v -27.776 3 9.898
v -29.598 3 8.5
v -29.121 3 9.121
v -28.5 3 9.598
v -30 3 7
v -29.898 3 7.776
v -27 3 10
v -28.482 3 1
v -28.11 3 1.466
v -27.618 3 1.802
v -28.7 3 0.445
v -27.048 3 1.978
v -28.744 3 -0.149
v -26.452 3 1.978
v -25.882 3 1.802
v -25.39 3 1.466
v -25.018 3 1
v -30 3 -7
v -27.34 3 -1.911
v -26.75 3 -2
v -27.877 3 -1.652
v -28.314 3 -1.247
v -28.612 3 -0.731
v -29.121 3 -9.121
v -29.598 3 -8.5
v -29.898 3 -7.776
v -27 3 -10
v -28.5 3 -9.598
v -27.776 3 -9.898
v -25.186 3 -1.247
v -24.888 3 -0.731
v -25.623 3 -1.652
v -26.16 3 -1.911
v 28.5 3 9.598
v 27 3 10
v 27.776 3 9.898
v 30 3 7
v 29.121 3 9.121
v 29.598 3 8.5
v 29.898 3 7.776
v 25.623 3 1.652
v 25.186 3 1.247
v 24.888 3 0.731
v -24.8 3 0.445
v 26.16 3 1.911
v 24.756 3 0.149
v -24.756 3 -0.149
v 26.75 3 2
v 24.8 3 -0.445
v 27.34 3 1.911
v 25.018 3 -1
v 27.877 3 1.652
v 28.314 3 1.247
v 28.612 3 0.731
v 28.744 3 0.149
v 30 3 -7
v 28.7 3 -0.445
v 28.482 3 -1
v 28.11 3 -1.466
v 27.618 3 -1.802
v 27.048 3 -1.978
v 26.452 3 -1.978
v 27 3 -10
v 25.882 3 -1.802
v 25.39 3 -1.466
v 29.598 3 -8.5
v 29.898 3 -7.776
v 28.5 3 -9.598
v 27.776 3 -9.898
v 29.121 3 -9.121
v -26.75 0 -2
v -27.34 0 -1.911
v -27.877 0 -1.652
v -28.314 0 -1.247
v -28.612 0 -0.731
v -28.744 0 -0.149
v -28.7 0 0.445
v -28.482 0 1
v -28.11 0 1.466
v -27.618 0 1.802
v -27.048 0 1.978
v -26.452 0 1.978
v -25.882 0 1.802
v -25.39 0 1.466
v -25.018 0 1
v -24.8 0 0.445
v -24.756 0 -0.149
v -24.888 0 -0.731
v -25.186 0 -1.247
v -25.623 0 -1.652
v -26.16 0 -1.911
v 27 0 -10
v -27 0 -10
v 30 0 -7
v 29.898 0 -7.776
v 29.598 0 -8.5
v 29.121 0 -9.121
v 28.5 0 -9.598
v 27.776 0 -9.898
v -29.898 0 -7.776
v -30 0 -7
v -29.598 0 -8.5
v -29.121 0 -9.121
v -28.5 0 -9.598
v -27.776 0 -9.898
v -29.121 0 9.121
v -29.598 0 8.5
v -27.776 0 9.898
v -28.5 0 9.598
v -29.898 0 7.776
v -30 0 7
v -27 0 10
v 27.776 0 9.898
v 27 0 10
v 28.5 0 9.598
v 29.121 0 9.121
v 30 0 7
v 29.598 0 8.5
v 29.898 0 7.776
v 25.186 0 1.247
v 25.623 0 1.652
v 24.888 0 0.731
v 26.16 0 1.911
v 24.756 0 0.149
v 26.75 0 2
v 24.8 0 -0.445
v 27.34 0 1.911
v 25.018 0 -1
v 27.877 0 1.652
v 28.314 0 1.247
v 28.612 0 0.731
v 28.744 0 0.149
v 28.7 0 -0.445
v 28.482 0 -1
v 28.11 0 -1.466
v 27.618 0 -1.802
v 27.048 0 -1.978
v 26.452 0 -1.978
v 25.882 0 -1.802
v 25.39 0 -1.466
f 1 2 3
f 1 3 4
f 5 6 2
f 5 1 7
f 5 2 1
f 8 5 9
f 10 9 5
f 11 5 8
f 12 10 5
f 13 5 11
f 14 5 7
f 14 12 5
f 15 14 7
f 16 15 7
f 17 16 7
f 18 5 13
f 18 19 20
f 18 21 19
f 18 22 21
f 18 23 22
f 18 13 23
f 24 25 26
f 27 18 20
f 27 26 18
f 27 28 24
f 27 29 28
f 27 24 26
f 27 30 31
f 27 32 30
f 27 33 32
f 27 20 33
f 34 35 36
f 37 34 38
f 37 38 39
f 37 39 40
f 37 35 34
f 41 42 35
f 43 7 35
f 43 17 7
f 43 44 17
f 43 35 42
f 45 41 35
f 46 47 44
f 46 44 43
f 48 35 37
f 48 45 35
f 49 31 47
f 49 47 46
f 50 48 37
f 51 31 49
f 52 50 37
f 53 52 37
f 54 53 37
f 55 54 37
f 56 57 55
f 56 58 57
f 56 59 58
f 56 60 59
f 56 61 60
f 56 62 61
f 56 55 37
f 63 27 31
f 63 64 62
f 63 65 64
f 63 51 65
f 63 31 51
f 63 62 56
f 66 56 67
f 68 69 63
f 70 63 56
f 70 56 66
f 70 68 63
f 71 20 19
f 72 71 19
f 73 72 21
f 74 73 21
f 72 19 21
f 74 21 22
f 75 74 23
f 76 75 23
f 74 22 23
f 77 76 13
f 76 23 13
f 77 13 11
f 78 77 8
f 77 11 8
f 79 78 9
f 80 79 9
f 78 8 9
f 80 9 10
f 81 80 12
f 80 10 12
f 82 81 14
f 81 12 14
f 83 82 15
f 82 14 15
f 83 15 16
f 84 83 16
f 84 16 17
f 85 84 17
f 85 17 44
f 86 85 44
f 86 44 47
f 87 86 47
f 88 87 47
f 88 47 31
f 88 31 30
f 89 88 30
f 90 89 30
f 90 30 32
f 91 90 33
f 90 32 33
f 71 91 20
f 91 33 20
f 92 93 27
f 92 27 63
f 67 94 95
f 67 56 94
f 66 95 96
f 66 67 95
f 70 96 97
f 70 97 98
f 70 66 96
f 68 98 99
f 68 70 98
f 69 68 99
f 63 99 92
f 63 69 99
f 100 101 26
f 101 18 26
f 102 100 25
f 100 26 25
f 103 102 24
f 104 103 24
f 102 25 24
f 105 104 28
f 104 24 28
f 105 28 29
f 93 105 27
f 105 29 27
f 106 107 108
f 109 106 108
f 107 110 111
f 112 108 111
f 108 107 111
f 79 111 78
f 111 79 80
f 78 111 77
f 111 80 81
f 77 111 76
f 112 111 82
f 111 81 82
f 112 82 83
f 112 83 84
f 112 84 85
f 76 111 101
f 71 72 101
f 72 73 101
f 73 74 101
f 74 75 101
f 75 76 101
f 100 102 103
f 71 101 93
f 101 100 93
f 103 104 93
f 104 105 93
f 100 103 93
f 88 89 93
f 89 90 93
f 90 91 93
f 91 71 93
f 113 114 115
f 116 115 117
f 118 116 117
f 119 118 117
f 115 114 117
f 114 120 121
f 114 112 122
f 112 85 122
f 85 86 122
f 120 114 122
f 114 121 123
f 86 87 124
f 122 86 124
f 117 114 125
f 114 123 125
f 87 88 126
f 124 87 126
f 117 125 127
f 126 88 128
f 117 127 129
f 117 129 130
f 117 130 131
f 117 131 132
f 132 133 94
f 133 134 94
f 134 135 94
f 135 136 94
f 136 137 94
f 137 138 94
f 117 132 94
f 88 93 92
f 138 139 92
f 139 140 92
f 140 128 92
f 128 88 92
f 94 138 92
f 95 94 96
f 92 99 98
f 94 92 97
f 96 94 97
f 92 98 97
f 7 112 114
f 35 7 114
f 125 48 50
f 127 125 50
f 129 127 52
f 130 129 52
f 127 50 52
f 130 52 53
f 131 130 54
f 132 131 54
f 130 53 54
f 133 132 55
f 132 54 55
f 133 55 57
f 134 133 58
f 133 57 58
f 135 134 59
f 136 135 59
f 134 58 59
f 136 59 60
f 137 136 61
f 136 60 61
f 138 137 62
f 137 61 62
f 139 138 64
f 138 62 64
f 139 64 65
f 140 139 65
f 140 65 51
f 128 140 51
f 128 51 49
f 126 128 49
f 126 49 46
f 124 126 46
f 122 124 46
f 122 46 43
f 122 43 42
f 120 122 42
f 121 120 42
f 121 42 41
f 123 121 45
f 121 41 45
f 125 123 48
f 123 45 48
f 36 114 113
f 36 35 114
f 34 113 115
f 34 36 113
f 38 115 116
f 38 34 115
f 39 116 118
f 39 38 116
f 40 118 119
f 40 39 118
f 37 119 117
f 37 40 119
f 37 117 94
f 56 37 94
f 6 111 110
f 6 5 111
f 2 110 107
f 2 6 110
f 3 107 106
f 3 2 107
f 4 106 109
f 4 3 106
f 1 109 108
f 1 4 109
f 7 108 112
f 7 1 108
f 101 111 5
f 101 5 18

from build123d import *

# Parameters (mm, degrees)
SKETCH_1_W          = 60
SKETCH_1_H          = 20
EXTRUDE_1_DEPTH     = 3
FILLET_1_R          = 3
SKETCH_2_R          = 2
CUT_EXTRUDE_1_DEPTH = 3


with BuildPart() as part:
    # Эскиз1 → Бобышка-Вытянуть1 (new body)
    with BuildSketch(Plane(origin=(0, 0, 0), x_dir=(1, 0, 0), z_dir=(0, 1, 0))):
        Rectangle(SKETCH_1_W, SKETCH_1_H)
    extrude(amount=EXTRUDE_1_DEPTH)

    # Скругление1
    fillet_1_edges = [part.edges().sort_by_distance(p)[0] for p in [
        (30, 1.5, 10),
        (-30, 1.5, 10),
        (-30, 1.5, -10),
        (30, 1.5, -10),
    ]]
    fillet(fillet_1_edges, radius=FILLET_1_R)

    # Эскиз2 → Вырез-Вытянуть1 (cut)
    with BuildSketch(Plane(origin=(0, 3, 0), x_dir=(1, 0, 0), z_dir=(0, 1, 0))):
        with Locations(Location((26.75, 0, 0), (0, 0, 270))):
            Circle(SKETCH_2_R)
        with Locations(Location((-26.75, 0, 0), (0, 0, 90))):
            Circle(SKETCH_2_R)
    extrude(amount=-CUT_EXTRUDE_1_DEPTH, mode=Mode.SUBTRACT)


solid = part.part
